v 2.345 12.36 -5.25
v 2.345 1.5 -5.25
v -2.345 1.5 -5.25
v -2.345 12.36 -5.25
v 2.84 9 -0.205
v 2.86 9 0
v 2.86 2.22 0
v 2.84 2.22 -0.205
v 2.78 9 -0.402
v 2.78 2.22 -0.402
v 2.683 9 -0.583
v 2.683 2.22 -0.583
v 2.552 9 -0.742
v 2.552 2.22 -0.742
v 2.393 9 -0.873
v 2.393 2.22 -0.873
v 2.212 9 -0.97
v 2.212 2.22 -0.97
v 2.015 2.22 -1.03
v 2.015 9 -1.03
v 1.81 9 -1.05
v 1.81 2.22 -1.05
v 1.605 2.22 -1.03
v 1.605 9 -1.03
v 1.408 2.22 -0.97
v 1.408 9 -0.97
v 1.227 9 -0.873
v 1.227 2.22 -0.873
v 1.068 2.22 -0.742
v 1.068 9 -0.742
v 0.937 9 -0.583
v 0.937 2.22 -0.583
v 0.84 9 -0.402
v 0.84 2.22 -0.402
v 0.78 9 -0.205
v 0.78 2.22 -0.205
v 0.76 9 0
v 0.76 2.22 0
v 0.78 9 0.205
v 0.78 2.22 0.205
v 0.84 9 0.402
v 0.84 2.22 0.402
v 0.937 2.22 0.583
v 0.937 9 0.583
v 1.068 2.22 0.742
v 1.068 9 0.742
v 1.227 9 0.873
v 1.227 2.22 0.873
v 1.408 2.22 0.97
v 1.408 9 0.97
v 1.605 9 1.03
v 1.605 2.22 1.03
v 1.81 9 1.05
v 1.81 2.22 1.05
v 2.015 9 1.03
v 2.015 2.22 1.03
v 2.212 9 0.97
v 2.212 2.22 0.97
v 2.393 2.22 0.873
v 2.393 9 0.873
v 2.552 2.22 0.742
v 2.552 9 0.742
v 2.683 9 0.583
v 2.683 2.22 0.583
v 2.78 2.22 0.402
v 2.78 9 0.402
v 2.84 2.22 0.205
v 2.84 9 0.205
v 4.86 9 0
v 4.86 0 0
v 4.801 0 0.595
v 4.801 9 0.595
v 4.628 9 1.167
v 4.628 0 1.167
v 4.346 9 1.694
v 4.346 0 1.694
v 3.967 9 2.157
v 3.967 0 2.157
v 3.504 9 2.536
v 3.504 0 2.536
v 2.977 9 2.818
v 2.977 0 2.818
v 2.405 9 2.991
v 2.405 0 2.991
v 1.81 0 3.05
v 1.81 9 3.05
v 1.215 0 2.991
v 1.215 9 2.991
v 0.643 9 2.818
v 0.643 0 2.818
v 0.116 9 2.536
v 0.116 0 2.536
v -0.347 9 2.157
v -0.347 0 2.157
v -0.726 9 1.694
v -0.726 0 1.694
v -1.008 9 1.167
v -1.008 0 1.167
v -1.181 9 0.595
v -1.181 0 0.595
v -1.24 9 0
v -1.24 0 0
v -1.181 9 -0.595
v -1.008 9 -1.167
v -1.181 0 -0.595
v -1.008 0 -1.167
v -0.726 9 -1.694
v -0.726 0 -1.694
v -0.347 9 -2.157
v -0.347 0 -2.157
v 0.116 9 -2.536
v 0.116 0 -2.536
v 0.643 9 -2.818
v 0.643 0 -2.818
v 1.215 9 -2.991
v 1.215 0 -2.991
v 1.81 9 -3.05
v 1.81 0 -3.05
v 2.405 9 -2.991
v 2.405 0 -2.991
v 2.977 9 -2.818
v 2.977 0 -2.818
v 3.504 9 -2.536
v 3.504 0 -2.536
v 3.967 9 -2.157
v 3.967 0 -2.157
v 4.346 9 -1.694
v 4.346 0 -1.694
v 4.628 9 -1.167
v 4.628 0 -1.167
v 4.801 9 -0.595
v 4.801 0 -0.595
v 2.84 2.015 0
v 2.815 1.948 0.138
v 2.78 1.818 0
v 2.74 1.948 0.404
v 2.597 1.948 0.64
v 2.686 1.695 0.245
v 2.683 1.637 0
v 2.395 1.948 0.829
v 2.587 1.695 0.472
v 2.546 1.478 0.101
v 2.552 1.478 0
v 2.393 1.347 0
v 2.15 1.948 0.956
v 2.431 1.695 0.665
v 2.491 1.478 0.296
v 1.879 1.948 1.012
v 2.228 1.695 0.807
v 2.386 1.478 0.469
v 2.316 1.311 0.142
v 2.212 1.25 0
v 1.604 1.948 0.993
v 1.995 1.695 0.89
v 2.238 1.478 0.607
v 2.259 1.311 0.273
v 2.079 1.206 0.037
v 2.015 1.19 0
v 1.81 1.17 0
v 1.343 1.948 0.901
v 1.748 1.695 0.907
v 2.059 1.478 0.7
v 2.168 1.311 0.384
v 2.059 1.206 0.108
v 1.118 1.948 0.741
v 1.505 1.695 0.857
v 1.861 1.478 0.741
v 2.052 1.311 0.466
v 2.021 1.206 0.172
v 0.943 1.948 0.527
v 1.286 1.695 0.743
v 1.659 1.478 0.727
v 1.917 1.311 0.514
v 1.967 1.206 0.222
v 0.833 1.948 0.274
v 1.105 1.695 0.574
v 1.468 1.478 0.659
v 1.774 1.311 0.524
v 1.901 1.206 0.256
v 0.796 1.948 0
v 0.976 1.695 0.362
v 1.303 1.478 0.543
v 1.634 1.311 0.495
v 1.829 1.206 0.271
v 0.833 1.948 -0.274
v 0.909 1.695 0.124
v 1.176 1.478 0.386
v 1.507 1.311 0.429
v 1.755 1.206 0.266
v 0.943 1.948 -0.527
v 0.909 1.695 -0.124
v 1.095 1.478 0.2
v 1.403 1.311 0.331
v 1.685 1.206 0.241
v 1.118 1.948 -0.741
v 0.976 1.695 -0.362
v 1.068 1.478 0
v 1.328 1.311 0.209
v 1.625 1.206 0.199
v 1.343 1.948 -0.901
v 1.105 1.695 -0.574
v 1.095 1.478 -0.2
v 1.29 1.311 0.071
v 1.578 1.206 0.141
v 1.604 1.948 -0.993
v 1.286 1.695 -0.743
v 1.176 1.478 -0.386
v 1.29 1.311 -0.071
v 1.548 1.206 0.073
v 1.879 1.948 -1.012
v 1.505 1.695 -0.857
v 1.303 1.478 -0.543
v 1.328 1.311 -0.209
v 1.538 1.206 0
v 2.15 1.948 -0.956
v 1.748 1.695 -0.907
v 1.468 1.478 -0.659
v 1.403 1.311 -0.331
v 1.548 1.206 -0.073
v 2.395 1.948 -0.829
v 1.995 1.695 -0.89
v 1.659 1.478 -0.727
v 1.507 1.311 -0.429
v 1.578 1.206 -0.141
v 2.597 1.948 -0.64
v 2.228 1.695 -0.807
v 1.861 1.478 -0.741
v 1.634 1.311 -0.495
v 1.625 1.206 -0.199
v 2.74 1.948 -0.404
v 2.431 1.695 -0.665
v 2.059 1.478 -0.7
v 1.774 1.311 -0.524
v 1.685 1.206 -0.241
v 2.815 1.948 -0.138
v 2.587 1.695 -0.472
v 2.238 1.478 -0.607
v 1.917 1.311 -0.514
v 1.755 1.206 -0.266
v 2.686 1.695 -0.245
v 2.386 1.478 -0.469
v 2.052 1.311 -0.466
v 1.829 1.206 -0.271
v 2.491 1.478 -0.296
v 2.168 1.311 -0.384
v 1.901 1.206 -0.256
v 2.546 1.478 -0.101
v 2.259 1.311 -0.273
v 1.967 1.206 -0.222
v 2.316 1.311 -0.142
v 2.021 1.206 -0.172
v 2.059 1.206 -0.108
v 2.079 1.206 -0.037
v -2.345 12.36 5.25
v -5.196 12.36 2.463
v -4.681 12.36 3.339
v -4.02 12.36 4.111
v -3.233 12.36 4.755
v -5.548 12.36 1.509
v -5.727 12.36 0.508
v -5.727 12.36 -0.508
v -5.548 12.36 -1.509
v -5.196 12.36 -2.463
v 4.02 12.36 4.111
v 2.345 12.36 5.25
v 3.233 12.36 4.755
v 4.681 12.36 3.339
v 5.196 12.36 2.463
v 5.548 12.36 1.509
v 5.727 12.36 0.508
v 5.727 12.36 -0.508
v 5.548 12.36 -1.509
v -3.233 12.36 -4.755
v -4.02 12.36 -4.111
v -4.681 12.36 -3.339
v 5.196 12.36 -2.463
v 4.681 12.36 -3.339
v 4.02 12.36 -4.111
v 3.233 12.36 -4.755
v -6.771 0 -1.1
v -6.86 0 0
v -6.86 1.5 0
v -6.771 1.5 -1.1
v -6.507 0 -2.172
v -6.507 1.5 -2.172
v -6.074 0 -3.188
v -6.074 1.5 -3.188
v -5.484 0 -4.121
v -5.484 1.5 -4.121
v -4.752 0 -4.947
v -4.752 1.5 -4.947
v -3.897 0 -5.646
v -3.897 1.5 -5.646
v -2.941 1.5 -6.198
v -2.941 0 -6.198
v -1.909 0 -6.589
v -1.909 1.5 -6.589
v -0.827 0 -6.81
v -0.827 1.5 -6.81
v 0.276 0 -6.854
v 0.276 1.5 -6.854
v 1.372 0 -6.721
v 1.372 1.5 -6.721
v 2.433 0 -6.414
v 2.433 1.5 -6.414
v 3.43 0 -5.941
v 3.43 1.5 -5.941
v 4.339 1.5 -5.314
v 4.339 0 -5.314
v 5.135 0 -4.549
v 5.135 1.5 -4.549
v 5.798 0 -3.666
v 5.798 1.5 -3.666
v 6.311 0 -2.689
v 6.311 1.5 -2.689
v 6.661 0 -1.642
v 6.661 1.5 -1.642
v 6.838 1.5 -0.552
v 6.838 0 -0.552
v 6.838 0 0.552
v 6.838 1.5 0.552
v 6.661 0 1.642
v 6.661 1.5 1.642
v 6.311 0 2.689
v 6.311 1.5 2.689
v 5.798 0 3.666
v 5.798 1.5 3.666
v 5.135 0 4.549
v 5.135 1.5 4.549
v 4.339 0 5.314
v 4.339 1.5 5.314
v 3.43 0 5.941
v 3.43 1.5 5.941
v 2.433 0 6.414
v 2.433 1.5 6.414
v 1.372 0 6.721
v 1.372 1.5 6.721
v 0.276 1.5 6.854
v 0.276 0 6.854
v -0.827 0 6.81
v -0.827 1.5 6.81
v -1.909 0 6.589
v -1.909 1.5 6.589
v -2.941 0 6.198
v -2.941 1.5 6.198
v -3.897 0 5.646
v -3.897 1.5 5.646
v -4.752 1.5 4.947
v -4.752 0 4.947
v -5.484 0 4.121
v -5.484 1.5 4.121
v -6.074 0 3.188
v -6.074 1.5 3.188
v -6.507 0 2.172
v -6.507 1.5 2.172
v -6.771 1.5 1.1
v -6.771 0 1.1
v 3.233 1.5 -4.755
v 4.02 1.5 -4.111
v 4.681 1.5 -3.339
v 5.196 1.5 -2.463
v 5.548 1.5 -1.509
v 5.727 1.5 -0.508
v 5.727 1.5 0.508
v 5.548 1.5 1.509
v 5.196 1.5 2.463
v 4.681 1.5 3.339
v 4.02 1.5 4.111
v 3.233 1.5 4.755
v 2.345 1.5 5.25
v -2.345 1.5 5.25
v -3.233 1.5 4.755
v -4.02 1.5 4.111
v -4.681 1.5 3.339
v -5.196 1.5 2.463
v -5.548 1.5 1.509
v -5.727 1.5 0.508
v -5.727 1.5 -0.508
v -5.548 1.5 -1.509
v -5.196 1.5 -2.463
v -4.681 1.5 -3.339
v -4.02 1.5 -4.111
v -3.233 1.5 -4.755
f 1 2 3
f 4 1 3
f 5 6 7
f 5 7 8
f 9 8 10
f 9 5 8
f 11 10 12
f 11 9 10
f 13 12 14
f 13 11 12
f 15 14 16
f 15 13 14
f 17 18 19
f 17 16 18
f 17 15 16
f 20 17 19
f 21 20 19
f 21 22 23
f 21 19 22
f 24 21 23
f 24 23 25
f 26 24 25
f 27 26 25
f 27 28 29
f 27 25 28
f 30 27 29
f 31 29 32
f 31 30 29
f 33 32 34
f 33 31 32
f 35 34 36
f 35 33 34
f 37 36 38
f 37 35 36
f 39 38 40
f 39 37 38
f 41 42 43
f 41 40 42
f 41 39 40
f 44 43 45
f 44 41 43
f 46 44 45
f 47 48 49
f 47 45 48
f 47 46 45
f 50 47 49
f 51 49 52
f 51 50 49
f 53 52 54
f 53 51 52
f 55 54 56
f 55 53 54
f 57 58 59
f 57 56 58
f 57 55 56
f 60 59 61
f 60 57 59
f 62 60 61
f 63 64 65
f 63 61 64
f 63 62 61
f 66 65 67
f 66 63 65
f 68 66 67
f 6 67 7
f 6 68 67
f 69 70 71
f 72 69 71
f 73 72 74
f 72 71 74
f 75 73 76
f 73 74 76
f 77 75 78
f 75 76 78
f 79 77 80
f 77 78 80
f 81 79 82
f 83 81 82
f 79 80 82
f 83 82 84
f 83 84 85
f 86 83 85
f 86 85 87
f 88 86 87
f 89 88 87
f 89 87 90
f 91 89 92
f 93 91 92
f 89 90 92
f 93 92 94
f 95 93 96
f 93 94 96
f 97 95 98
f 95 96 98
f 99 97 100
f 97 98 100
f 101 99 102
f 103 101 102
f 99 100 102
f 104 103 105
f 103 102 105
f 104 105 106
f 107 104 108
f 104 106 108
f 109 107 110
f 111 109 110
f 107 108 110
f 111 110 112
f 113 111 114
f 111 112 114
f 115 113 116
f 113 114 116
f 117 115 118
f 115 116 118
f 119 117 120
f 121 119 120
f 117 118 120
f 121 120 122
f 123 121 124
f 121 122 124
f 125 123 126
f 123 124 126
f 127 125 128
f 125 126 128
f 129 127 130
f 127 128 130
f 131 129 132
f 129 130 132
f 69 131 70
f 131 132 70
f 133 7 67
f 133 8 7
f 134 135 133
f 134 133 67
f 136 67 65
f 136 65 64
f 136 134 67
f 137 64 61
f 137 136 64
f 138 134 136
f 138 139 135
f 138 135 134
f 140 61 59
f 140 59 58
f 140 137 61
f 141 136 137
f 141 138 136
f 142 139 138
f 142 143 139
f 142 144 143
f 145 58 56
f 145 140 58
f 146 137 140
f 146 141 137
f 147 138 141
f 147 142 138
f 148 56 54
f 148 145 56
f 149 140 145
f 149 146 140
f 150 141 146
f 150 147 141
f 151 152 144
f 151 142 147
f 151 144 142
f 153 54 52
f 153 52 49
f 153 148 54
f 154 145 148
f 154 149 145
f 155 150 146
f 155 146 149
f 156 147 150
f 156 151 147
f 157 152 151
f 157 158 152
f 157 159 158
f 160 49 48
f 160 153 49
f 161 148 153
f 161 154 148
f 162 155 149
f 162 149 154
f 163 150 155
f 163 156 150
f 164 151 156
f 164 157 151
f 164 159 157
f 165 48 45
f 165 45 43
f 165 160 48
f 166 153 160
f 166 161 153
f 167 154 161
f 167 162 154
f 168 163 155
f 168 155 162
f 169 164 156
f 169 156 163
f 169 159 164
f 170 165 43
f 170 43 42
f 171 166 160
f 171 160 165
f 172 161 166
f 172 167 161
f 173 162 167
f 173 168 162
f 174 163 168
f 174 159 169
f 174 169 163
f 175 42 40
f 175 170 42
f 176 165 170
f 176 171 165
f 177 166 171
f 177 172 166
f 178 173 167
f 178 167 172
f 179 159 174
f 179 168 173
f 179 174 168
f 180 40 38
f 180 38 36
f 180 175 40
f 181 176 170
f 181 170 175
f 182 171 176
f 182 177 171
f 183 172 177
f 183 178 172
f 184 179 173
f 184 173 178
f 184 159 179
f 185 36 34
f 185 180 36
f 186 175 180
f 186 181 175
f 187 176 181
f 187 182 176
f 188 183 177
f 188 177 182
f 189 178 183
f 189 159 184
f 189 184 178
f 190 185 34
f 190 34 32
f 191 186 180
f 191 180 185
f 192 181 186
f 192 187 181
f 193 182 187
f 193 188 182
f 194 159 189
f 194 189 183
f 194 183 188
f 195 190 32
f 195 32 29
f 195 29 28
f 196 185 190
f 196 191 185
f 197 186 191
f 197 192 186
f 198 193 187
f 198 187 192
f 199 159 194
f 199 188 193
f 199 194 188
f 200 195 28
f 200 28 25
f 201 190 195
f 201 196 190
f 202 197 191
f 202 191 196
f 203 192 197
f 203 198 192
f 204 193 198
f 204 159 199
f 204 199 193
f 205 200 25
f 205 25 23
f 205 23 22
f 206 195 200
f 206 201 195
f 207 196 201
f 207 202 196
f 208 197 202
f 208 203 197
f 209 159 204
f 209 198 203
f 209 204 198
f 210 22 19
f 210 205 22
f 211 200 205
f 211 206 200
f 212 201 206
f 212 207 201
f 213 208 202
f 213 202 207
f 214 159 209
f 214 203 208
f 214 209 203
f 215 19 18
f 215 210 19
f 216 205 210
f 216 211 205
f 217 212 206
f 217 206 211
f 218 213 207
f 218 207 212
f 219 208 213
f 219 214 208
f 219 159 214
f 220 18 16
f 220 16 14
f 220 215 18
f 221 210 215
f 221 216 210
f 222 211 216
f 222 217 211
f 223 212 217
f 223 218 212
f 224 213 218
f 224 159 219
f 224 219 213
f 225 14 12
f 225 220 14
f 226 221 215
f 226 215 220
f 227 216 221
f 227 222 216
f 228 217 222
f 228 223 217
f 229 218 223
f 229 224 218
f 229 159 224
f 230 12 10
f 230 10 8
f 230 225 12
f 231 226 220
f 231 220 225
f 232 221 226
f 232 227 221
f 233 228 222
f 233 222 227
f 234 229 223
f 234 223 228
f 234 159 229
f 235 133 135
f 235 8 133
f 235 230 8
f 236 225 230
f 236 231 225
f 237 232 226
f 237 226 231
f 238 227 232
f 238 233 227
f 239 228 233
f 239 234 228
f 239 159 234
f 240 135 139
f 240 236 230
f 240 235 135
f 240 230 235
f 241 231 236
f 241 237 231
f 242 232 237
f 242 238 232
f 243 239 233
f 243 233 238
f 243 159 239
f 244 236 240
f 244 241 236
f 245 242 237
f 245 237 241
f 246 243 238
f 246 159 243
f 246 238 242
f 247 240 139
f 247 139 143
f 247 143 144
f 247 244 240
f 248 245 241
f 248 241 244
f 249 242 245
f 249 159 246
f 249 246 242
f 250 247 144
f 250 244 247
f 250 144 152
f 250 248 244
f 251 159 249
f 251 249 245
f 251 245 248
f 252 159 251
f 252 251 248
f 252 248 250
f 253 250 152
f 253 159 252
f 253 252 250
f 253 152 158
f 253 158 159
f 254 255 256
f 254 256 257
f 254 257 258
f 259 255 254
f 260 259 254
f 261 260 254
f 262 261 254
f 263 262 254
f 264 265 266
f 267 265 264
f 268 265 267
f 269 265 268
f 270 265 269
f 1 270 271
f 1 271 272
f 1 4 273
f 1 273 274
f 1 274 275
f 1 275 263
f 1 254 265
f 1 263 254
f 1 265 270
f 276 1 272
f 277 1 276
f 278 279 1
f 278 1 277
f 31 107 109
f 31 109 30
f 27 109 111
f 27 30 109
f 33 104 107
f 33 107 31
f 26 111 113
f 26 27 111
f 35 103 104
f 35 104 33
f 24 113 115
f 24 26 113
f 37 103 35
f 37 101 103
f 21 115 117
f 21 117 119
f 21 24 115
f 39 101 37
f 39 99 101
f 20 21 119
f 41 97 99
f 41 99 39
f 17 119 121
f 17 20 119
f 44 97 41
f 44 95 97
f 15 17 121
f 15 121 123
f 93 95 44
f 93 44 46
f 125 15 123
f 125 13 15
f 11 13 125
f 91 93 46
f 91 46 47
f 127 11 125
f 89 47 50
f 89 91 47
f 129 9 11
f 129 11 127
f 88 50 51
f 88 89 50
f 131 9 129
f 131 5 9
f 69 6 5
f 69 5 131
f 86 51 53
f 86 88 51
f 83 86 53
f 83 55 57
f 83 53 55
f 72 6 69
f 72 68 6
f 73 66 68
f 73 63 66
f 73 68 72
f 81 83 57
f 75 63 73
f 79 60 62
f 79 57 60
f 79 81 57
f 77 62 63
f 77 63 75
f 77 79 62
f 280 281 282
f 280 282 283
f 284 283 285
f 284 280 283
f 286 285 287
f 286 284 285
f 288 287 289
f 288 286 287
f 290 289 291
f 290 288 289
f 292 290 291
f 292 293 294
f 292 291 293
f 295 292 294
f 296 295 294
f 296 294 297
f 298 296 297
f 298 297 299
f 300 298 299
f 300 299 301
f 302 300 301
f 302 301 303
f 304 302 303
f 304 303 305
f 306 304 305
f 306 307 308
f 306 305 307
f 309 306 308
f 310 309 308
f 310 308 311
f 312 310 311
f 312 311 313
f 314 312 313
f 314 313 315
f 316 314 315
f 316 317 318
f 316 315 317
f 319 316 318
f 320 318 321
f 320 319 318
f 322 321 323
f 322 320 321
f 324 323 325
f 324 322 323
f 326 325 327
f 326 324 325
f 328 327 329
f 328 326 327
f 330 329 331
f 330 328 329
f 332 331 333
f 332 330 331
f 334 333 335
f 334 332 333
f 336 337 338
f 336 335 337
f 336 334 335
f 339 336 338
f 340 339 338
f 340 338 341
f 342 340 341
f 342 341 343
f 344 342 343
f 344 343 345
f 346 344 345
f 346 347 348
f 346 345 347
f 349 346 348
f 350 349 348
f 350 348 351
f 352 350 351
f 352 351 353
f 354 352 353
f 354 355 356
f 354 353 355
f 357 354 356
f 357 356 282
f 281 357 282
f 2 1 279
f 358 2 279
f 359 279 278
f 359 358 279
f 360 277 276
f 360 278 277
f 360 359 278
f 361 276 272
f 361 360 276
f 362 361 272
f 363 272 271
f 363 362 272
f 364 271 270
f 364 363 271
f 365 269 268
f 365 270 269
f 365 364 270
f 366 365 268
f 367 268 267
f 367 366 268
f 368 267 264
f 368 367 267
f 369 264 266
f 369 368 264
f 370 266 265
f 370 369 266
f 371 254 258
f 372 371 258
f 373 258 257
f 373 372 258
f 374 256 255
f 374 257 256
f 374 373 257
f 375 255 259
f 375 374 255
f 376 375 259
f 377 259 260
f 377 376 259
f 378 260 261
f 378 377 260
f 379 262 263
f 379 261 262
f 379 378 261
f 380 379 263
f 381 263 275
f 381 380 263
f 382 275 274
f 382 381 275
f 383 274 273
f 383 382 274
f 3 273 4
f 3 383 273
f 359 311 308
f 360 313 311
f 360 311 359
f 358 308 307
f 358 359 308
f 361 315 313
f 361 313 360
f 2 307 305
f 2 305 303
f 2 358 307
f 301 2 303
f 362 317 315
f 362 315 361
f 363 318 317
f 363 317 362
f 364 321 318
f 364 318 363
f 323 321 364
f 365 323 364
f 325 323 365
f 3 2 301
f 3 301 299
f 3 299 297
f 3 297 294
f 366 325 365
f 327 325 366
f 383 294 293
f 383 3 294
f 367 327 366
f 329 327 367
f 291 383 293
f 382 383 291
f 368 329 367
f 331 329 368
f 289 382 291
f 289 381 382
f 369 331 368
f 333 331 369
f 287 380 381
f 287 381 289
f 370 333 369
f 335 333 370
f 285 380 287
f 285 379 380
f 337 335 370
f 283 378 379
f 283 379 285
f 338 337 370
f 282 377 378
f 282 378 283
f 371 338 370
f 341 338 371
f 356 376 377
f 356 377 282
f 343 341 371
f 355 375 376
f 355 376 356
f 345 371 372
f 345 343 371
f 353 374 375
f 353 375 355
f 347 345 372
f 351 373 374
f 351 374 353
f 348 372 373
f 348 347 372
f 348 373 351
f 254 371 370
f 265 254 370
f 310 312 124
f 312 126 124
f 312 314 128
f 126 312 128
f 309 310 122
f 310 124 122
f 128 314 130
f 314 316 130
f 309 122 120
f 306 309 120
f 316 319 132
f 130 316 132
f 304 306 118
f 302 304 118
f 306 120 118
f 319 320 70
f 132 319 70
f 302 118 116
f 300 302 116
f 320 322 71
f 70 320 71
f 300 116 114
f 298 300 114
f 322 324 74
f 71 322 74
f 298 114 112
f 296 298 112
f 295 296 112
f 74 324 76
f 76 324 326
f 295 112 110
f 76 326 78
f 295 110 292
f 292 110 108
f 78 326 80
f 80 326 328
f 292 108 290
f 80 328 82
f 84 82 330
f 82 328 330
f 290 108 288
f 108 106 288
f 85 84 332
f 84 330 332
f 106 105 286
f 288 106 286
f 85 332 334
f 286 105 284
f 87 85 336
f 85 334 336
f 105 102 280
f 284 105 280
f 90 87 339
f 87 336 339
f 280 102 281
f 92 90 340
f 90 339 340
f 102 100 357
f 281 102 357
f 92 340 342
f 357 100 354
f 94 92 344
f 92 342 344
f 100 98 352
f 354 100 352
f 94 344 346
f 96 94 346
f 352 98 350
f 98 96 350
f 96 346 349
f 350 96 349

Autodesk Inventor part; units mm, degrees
ref_plane "YZ Plane" through (0, 0, 0) normal (1, 0, 0) x (0, 1, 0)
ref_plane "XZ Plane" through (0, 0, 0) normal (0, 1, 0) x (-1, 0, 0)
ref_plane "XY Plane" through (0, 0, 0) normal (0, 0, 1) x (1, 0, 0)
sketch "Sketch1" plane through (0, 0, 0) normal (0, 1, 0) x (-1, 0, 0)
  circle A0 centre (0, 0) radius 6.86
  dimension "d0" = 13.72
extrude "Extrusion1" add sketch "Sketch1" along normal blind 1.5
sketch "Sketch2" plane through (0, 1.5, 0) normal (0, 1, 0) x (1, 0, 0)
  line L0 (-2.3452, -5.25) -> (2.3452, -5.25)
  line L1 (2.3452, 5.25) -> (-2.3452, 5.25)
  line L2 (0, 0) -> (0, 5.25) construction
  line L3 (0, 0) -> (0, -5.25) construction
  arc A0 (2.3452, -5.25) -> (2.3452, 5.25) centre (0, 0) ccw
  arc A1 (-2.3452, 5.25) -> (-2.3452, -5.25) centre (0, 0) ccw
  dimension "Barrel_Flat_Width" = 10.5
  dimension "d5" = 5.75
extrude "Extrusion2" add sketch "Sketch2" along normal blind 10.86
thread "Thread1" size "M12x0.75" class "6g" standard "ANSI Metric M Profile" full length
thread "Thread2" size "M12x0.75" class "6g" standard "ANSI Metric M Profile" full length
sketch "Sketch3" plane through (0, 0, 0) normal (0, -1, 0) x (1, 0, 0)
  circle A0 centre (1.81, 0) radius 3.05
  line L0 (0, 0) -> (1.81, 0) construction
  circle A1 centre (0, 0) radius 6.86 construction
  dimension "d12" = 6.1
  dimension "d14" = 2
extrude "Extrusion3" cut sketch "Sketch3" against normal blind 9
sketch "Sketch4" plane through (1.81, 9, 0) normal (0, -1, 0) x (1, 0, 0)
  circle A0 centre (0, 0) radius 3.05 construction
  circle A1 centre (0, 0) radius 1.05
  point P0 (-1.81, 0)
  dimension "d17" = 2.1
extrude "Extrusion4" add sketch "Sketch4" along normal blind 7.83
fillet "Fillet1" radius 1.05 1 edges at (0.76, 1.17, 0)
properties part number "Barrel_Jack" material "PC/ABS Plastic"
